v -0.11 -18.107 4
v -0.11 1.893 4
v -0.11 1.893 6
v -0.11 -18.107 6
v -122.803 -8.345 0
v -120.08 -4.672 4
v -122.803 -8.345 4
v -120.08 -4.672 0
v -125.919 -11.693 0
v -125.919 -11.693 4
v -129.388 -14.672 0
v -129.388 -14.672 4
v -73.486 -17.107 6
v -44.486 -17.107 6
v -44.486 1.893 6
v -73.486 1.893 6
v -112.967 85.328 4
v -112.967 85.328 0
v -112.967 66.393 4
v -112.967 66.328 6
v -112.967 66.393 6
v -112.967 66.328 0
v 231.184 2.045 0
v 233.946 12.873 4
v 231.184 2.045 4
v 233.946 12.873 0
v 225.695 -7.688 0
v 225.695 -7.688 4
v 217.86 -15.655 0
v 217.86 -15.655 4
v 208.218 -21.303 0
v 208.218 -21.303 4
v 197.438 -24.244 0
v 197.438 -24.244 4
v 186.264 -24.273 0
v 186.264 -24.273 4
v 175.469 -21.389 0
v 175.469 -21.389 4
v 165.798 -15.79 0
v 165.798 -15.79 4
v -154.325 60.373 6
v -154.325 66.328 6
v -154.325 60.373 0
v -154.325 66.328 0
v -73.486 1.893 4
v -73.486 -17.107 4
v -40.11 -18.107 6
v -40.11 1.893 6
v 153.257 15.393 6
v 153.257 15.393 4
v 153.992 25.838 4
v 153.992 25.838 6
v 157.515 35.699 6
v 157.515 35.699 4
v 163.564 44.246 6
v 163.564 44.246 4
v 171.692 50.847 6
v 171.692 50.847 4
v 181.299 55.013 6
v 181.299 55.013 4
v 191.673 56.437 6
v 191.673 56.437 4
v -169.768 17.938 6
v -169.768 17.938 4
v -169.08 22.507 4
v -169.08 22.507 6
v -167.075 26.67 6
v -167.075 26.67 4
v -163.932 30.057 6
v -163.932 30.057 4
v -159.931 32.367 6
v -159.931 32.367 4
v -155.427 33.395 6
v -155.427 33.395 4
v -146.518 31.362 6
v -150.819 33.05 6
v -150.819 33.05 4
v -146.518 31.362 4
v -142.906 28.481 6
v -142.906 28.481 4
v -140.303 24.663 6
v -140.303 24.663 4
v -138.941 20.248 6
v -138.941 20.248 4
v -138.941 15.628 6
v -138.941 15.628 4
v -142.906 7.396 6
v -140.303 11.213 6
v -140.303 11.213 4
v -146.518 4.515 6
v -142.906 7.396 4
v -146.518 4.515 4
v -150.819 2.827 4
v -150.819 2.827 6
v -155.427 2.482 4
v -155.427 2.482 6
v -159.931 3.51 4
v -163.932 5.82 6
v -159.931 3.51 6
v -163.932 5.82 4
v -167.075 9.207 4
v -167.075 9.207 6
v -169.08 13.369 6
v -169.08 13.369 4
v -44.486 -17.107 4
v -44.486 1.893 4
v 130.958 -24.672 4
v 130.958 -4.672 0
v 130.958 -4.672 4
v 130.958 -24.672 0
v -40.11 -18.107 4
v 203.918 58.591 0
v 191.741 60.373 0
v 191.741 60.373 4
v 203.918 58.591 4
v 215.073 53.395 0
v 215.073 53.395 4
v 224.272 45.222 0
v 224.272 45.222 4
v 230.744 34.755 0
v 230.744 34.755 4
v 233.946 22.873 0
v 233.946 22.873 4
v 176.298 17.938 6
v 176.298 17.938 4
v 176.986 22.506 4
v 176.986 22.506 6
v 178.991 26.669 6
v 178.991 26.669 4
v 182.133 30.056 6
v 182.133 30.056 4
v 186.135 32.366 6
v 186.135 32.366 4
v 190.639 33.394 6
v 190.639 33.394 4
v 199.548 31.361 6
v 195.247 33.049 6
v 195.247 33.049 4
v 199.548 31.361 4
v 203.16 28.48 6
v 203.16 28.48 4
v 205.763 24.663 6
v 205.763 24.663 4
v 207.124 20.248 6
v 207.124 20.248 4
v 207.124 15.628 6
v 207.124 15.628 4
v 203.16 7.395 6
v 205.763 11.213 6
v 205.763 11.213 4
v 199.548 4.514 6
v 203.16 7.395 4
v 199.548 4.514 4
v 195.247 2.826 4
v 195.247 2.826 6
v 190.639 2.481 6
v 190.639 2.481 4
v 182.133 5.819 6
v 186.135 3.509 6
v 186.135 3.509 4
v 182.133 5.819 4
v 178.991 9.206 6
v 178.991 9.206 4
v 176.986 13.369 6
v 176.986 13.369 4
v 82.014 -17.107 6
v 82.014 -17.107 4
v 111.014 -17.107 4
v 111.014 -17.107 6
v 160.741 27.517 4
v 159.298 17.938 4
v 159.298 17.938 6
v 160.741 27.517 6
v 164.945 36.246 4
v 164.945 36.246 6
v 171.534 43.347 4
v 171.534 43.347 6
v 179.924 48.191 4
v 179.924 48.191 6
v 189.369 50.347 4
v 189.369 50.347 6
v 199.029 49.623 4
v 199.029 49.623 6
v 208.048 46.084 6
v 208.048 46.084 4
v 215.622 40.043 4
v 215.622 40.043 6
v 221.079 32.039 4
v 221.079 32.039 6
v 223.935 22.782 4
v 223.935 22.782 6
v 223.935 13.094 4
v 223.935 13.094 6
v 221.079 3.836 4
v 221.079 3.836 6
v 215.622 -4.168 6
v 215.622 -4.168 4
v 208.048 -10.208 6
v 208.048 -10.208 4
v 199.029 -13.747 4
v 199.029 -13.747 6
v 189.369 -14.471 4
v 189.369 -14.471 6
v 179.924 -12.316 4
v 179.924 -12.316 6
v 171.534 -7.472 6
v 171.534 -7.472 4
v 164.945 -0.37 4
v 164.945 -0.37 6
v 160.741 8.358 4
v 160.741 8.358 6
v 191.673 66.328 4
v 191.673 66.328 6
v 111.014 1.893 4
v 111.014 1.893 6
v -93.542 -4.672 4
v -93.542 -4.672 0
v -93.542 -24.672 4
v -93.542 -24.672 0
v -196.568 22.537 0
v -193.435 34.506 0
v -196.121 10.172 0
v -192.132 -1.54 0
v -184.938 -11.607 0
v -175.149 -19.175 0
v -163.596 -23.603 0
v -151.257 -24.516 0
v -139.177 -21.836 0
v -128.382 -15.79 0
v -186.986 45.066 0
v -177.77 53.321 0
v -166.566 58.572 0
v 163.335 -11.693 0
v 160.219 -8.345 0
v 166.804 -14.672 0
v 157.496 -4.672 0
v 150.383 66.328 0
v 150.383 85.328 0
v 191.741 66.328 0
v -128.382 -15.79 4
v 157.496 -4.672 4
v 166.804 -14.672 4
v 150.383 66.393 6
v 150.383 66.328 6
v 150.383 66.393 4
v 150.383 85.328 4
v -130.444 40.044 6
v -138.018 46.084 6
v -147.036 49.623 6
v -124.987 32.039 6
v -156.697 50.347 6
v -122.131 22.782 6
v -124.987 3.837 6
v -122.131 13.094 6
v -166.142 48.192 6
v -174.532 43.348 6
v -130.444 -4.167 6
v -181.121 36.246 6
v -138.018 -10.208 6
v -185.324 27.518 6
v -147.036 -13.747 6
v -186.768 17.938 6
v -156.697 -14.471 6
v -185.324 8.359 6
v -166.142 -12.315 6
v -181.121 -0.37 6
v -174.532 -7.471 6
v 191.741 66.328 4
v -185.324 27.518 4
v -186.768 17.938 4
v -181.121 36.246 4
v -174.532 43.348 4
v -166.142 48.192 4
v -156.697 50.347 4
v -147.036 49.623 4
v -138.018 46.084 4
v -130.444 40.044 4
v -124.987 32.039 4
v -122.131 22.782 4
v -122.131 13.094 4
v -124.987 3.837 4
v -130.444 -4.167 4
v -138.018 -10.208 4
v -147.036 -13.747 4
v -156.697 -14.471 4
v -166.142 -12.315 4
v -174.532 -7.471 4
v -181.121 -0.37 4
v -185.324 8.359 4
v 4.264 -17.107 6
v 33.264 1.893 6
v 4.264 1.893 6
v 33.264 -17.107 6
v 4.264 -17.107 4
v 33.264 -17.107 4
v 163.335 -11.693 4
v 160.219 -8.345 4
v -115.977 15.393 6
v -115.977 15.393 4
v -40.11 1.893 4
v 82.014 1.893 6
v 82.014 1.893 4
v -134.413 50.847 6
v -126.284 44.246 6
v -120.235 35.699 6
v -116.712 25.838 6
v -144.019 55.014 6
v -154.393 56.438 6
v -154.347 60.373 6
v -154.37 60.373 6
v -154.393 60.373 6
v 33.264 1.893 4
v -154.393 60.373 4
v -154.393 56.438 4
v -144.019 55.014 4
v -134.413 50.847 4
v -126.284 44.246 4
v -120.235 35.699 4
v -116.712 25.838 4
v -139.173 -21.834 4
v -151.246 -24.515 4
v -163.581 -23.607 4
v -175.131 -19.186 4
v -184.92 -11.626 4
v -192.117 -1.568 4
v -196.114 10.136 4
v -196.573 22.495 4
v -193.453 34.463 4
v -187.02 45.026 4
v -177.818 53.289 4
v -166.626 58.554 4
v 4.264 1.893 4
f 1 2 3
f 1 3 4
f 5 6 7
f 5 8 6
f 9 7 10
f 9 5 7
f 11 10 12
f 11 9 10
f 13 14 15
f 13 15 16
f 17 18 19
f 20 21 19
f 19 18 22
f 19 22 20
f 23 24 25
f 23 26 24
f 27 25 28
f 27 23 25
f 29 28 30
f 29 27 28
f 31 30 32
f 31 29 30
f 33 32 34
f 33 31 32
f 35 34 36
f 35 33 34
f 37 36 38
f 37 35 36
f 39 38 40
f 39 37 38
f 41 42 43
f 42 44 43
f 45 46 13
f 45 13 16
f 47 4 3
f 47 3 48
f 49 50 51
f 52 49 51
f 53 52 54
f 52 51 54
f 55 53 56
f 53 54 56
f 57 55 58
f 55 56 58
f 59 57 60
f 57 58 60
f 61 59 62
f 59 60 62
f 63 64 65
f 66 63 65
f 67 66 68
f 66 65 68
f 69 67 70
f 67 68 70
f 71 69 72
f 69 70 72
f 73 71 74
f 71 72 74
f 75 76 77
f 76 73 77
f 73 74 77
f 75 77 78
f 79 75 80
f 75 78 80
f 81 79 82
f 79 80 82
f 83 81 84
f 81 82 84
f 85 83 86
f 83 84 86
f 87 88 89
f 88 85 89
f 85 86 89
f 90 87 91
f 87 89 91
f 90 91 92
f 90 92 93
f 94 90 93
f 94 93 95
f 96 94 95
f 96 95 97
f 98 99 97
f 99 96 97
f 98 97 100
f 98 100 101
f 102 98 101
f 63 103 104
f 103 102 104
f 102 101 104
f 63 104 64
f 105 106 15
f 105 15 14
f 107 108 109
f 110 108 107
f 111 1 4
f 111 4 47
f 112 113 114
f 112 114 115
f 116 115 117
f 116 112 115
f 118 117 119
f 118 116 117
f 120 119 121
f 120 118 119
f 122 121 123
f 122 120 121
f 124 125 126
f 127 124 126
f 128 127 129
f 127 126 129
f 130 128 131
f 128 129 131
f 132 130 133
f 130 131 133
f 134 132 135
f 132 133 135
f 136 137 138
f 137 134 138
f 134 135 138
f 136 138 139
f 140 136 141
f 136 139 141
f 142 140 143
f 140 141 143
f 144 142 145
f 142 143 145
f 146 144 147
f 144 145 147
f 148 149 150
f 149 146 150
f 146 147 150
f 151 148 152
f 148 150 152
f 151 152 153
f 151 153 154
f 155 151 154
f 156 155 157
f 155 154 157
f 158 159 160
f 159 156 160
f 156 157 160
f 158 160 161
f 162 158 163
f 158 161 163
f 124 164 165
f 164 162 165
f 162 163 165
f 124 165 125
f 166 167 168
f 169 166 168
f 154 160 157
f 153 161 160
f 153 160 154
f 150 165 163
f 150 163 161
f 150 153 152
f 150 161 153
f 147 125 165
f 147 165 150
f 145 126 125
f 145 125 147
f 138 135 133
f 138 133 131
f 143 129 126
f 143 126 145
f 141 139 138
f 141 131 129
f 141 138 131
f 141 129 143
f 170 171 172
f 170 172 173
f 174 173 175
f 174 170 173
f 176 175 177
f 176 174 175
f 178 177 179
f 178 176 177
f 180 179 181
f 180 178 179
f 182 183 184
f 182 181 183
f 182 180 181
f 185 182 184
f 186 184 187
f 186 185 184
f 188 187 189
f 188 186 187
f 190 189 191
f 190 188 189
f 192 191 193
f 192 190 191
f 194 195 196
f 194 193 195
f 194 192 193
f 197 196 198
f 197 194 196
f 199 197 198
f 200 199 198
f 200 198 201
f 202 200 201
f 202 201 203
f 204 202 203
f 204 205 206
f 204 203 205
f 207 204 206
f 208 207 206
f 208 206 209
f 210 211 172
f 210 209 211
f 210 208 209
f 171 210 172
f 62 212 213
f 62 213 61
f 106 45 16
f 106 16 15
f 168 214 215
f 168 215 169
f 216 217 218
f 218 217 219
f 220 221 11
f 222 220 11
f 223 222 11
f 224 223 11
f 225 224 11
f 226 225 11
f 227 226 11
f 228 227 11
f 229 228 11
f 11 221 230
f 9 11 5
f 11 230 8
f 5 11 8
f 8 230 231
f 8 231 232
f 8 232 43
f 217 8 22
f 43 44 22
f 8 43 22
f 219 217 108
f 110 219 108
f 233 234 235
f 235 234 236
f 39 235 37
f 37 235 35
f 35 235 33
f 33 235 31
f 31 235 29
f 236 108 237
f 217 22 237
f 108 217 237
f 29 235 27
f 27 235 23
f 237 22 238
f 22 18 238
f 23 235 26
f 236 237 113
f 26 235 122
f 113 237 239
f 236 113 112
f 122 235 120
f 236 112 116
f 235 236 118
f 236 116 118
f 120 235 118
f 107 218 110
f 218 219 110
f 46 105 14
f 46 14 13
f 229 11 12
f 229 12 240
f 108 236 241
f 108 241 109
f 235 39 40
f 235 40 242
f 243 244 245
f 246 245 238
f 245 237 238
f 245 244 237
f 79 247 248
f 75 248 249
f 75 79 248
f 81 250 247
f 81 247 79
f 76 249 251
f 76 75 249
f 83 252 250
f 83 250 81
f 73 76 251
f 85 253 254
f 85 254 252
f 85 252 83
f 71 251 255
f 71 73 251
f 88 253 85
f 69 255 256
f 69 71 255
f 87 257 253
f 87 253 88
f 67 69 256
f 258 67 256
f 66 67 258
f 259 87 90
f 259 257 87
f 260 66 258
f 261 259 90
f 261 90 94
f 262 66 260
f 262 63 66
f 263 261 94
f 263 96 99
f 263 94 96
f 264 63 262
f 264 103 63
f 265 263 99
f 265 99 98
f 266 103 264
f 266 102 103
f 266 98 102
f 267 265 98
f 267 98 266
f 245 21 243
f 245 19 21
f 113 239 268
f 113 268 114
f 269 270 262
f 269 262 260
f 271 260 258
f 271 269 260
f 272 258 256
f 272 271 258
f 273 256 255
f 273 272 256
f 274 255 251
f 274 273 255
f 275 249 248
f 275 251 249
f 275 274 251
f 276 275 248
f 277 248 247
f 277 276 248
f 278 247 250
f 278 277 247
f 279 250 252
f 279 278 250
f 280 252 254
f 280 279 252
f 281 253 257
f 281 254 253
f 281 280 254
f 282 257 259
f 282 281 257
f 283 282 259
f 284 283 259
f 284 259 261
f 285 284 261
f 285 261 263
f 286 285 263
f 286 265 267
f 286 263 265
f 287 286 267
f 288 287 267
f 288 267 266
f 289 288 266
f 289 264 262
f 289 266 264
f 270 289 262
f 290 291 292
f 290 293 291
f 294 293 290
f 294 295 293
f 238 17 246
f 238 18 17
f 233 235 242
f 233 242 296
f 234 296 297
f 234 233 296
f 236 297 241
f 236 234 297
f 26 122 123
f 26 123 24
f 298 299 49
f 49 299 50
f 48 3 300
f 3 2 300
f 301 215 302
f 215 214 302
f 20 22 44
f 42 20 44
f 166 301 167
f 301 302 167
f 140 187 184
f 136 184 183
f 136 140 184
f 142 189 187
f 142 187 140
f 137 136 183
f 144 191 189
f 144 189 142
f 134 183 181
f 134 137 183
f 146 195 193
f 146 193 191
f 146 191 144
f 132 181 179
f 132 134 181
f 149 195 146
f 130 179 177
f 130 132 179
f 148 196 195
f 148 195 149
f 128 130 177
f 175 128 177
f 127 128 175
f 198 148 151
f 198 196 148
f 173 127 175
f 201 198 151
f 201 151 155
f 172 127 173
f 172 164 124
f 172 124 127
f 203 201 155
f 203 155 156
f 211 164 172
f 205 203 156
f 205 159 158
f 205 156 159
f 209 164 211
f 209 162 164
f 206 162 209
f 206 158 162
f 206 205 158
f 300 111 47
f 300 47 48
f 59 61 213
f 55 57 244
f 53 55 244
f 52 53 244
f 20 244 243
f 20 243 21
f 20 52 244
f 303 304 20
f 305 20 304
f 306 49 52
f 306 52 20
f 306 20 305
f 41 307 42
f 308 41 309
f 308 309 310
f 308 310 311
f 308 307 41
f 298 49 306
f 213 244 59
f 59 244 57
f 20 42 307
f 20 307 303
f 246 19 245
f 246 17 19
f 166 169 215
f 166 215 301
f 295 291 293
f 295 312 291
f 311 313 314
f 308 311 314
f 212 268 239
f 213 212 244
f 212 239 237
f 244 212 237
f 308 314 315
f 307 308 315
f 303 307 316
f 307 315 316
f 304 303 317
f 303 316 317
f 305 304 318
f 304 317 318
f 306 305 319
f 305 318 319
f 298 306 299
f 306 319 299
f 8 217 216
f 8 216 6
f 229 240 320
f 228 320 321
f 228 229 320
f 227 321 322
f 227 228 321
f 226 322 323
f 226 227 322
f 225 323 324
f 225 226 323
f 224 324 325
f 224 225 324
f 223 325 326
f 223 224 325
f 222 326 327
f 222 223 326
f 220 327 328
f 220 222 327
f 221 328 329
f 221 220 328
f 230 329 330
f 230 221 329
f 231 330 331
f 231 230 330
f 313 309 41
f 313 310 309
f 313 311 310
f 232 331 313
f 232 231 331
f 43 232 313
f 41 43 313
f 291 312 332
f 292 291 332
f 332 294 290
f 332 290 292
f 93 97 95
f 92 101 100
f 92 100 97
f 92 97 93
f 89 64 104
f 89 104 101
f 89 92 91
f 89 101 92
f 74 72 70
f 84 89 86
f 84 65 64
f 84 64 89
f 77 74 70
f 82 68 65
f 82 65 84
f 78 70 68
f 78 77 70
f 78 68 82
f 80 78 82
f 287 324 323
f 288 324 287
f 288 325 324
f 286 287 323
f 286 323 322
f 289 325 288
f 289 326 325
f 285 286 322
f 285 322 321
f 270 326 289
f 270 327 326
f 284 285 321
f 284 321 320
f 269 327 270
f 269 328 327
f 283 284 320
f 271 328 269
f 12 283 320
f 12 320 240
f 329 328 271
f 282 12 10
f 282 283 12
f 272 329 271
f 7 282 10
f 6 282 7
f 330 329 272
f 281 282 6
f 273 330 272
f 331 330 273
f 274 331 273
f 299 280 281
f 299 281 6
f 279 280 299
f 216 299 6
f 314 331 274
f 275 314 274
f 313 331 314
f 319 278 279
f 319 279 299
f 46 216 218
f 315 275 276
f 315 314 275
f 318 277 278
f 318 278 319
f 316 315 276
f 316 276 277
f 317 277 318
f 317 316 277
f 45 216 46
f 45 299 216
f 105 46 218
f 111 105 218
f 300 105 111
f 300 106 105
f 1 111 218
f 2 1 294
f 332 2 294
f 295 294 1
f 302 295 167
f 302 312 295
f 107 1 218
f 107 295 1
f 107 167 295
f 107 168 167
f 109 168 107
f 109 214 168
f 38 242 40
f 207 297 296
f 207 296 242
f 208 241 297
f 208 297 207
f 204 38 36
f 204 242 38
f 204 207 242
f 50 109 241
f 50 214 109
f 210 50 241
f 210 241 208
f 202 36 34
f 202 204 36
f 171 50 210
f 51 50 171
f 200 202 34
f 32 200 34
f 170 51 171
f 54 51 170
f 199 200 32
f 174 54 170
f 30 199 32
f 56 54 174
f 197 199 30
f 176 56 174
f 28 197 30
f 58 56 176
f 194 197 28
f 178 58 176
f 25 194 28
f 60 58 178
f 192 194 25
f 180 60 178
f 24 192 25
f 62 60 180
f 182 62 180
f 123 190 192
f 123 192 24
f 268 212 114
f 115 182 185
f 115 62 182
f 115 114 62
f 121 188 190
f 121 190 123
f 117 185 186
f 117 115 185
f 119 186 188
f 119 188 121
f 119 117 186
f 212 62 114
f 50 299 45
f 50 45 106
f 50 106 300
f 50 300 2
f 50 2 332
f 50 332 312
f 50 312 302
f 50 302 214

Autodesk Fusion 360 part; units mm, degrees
sketch "Sketch1" plane through (0, 0, 0) normal (0, 0, 1) x (1, 0, 0)
  line L0 (110.9582, 1.828) -> (110.9582, -11.672)
  line L1 (-73.5418, 1.828) -> (-73.5418, -11.672)
  line L2 (-73.5418, -24.672) -> (110.9582, -24.672)
  line L3 (-73.5418, 15.328) -> (110.9582, 15.328)
  line L4 (110.9582, -24.672) -> (130.9582, -24.672)
  line L5 (130.9582, -24.672) -> (130.9582, -11.672)
  line L6 (130.9582, 15.328) -> (110.9582, 15.328)
  line L7 (-73.5418, 15.328) -> (-93.5418, 15.328)
  line L8 (-93.5418, -4.672) -> (-93.5418, -24.672)
  line L9 (-93.5418, -24.672) -> (-73.5418, -24.672)
  line L10 (130.9582, -4.672) -> (150.3831, -4.672)
  line L11 (130.9582, 15.328) -> (150.3831, 15.328)
  line L12 (-93.5418, -24.672) -> (-93.5418, -24)
  line L13 (-93.5418, -4.672) -> (-112.9667, -4.672)
  line L14 (-93.5418, 15.328) -> (-112.9667, 15.328)
  line L15 (130.9582, -4.672) -> (130.9582, -11.672)
  line L16 (-112.9667, 85.328) -> (-110, 85.328)
  line L17 (-110, 85.328) -> (150.3831, 85.328)
  line L18 (18.7082, 66.328) -> (150.3831, 66.328)
  line L19 (18.7082, 66.328) -> (16.2618, 66.328)
  line L20 (16.2618, 66.328) -> (-112.9667, 66.328)
  line L21 (157.4958, -4.672) -> (150.3831, -4.672)
  line L22 (191.7412, -4.672) -> (190, -4.672)
  line L23 (-112.9667, -4.672) -> (-120.0796, -4.672)
  circle A0 centre (191.7412, 17.8726) radius 32.5
  circle A1 centre (-154.3247, 17.873) radius 32.5
  line L24 (-112.9667, 66.328) -> (-154.3247, 66.328)
  line L25 (-154.3247, 66.328) -> (-154.3247, 60.373)
  line L26 (150.3831, 66.328) -> (191.7412, 66.328)
  line L27 (191.7412, 66.328) -> (191.7412, 60.3726)
  line L28 (150.3831, 66.328) -> (150.3831, 85.328)
  line L29 (150.3831, 15.328) -> (153.3253, 15.328)
  line L30 (191.7412, 60.3726) -> (191.7412, 56.3726)
  arc A2 (157.4958, -4.672) -> (166.8041, -14.672) centre (191.7412, 17.8726) ccw
  arc A3 (191.7412, 56.3726) -> (153.3253, 15.328) centre (191.7412, 17.8726) ccw
  line L31 (-112.9667, 66.328) -> (-112.9667, 85.328)
  line L32 (-154.3247, 60.373) -> (-154.3247, 56.373)
  line L33 (-112.9667, 15.328) -> (-115.9089, 15.328)
  arc A4 (-154.3247, 60.373) -> (-128.382, -15.7904) centre (-154.3247, 17.873) ccw
  arc A5 (-129.3883, -14.672) -> (-120.0796, -4.672) centre (-154.3247, 17.873) ccw
  arc A6 (-115.9089, 15.328) -> (-154.3247, 56.373) centre (-154.3247, 17.873) ccw
  line L34 (130.9582, -24.672) -> (130.9582, -14.672)
  line L35 (165.7979, -15.7904) -> (166.8041, -14.672)
  line L36 (-129.3883, -14.672) -> (-128.382, -15.7904)
  arc A7 (165.7979, -15.7904) -> (233.946, 12.8726) centre (191.7412, 17.8726) ccw
  arc A8 (233.946, 22.8726) -> (191.7412, 60.3726) centre (191.7412, 17.8726) ccw
  line L37 (110.9582, 1.828) -> (81.9582, 1.828)
  line L38 (81.9582, 1.828) -> (81.9582, -17.172)
  line L39 (81.9582, -17.172) -> (110.9582, -17.172)
  line L40 (110.9582, -17.172) -> (110.9582, -11.672)
  line L41 (-73.5418, 1.828) -> (-44.5418, 1.828)
  line L42 (-44.5418, 1.828) -> (-44.5418, -17.172)
  line L43 (-44.5418, -17.172) -> (-73.5418, -17.172)
  line L44 (-73.5418, -17.172) -> (-73.5418, -11.672)
  line L45 (33.2082, 1.828) -> (4.2082, 1.828)
  line L46 (33.2082, 1.828) -> (33.2082, -17.172)
  line L47 (33.2082, -17.172) -> (4.2082, -17.172)
  line L48 (4.2082, -17.172) -> (4.2082, 1.828)
  line L49 (-0.1668, 1.828) -> (-40.1668, 1.828)
  line L50 (-0.1668, 1.828) -> (-0.1668, -18.172)
  line L51 (-0.1668, -18.172) -> (-40.1668, -18.172)
  line L52 (-40.1668, -18.172) -> (-40.1668, 1.828)
  line L53 (233.946, 22.8726) -> (233.946, 12.8726)
  circle A9 centre (-154.3247, 17.873) radius 15.5
  circle A10 centre (191.7412, 17.8726) radius 15.5
  dimension "d9" = 13
  dimension "d10" = 13
  dimension "d12" = 13.5
  dimension "d13" = 13.5
  dimension "d14" = 20
  dimension "d15" = 20
  dimension "d16" = 20
  dimension "d17" = 20
  dimension "d50" = 70
  dimension "d51" = 70
  dimension "d57" = 65
  dimension "d58" = 77
  dimension "d59" = 65
  dimension "d60" = 77
  dimension "d61" = 82
  dimension "d63" = 82
  dimension "d64" = 85
  dimension "d65" = 10
  dimension "d68" = 29
  dimension "d69" = 19
  dimension "d70" = 29
  dimension "d71" = 19
  dimension "d73" = 29
  dimension "d74" = 19
  dimension "d76" = 40
  dimension "d77" = 20
  dimension "d78" = 40
  dimension "d79" = 31
  dimension "d80" = 31
extrude "Extrude1" add sketch "Sketch1" along normal blind 4 contours L0 L37 L38 L39 L40 | L1 L41 L42 L43 L44 | L2 L3 L4 L5 L6 L7 L8 L9 L10 L11 L12 L13 L14 L15 L21 L23 L29 L30 A2 A3 L32 L33 A4 A5 A6 L34 L35 L36 A7 A8 L53 | L3 L6 L7 L11 L14 L18 L19 L20 L24 L25 L26 L27 L29 L30 A3 L32 L33 A6 | L16 L17 L18 L19 L20 L28 L31 | A0 | A1 | L45 L46 L47 L48 | L49 L50 L51 L52 | A9 | A10
sketch "Sketch2" plane through (0, 0, 4) normal (0, 0, 1) x (-1, 0, 0)
  line L0 (-150.3831, -66.328) -> (-150.3831, -85.328)
  line L1 (-150.3831, -85.328) -> (112.9667, -85.328)
  line L2 (112.9667, -85.328) -> (112.9667, -66.328)
  line L3 (112.9667, -66.328) -> (154.3247, -66.328)
  line L4 (154.3247, -66.328) -> (154.3247, -60.373)
  arc A0 (154.3247, -60.373) -> (128.382, 15.7904) centre (154.3247, -17.873) ccw
  line L5 (128.382, 15.7904) -> (129.3883, 14.672)
  arc A1 (129.3883, 14.672) -> (120.0796, 4.672) centre (154.3247, -17.873) ccw
  line L6 (120.0796, 4.672) -> (93.5418, 4.672)
  line L7 (93.5418, 4.672) -> (93.5418, 24.672)
  line L8 (93.5418, 24.672) -> (-130.9582, 24.672)
  line L9 (-130.9582, 24.672) -> (-130.9582, 4.672)
  line L10 (-130.9582, 4.672) -> (-157.4958, 4.672)
  arc A2 (-157.4958, 4.672) -> (-166.8041, 14.672) centre (-191.7412, -17.8726) ccw
  line L11 (-166.8041, 14.672) -> (-165.7979, 15.7904)
  arc A3 (-165.7979, 15.7904) -> (-233.946, -12.8726) centre (-191.7412, -17.8726) ccw
  line L12 (-233.946, -12.8726) -> (-233.946, -22.8726)
  arc A4 (-233.946, -22.8726) -> (-191.7412, -60.3726) centre (-191.7412, -17.8726) ccw
  line L13 (-191.7412, -60.3726) -> (-191.7412, -66.328)
  line L14 (-191.7412, -66.328) -> (-150.3831, -66.328)
  arc A5 (-191.6728, -56.4374) -> (-153.2569, -15.3929) centre (-191.6728, -17.9374) ccw
  line L15 (154.393, -66.3929) -> (154.393, -60.4379)
  line L16 (73.6102, -15.3929) -> (-110.8898, -15.3929)
  line L17 (113.035, -66.3929) -> (113.035, -85.3929)
  line L18 (40.2352, 18.1071) -> (40.2352, -1.8929)
  line L19 (110.0684, -85.3929) -> (-150.3147, -85.3929)
  line L20 (0.2352, 18.1071) -> (40.2352, 18.1071)
  line L21 (-33.1398, -1.8929) -> (-33.1398, 17.1071)
  line L22 (-16.1934, -66.3929) -> (113.035, -66.3929)
  arc A6 (154.393, -60.4379) -> (128.4504, 15.7255) centre (154.393, -17.9379) ccw
  line L23 (-18.6398, -66.3929) -> (-150.3147, -66.3929)
  line L24 (73.6102, 24.6071) -> (-110.8898, 24.6071)
  arc A7 (129.4567, 14.6071) -> (120.148, 4.6071) centre (154.393, -17.9379) ccw
  line L25 (113.035, -66.3929) -> (154.393, -66.3929)
  line L26 (73.6102, -15.3929) -> (93.6102, -15.3929)
  line L27 (113.035, -15.3929) -> (115.9772, -15.3929)
  line L28 (113.035, 4.6071) -> (120.148, 4.6071)
  line L29 (93.6102, 4.6071) -> (113.035, 4.6071)
  line L30 (93.6102, 24.6071) -> (93.6102, 23.9351)
  line L31 (44.6102, 17.1071) -> (73.6102, 17.1071)
  line L32 (93.6102, 4.6071) -> (93.6102, 24.6071)
  line L33 (0.2352, -1.8929) -> (0.2352, 18.1071)
  line L34 (73.6102, -1.8929) -> (44.6102, -1.8929)
  line L35 (93.6102, 24.6071) -> (73.6102, 24.6071)
  line L36 (73.6102, 17.1071) -> (73.6102, 11.6071)
  line L37 (-18.6398, -66.3929) -> (-16.1934, -66.3929)
  line L38 (129.4567, 14.6071) -> (128.4504, 15.7255)
  line L39 (73.6102, -1.8929) -> (73.6102, 11.6071)
  line L40 (154.393, -60.4379) -> (154.393, -56.4379)
  line L41 (-4.1398, 17.1071) -> (-4.1398, -1.8929)
  line L42 (44.6102, -1.8929) -> (44.6102, 17.1071)
  line L43 (113.035, -85.3929) -> (110.0684, -85.3929)
  line L44 (93.6102, -15.3929) -> (113.035, -15.3929)
  line L45 (-33.1398, 17.1071) -> (-4.1398, 17.1071)
  line L46 (-33.1398, -1.8929) -> (-4.1398, -1.8929)
  line L47 (0.2352, -1.8929) -> (40.2352, -1.8929)
  circle A8 centre (-191.6728, -17.9374) radius 15.5
  line L48 (-110.8898, -1.8929) -> (-81.8898, -1.8929)
  line L49 (-191.6728, -60.4374) -> (-191.6728, -56.4374)
  line L50 (-130.8898, 4.6071) -> (-150.3147, 4.6071)
  line L51 (-130.8898, -15.3929) -> (-110.8898, -15.3929)
  line L52 (-81.8898, -1.8929) -> (-81.8898, 17.1071)
  arc A9 (-233.8776, -22.9374) -> (-191.6728, -60.4374) centre (-191.6728, -17.9374) ccw
  circle A10 centre (-191.6728, -17.9374) radius 32.5
  line L53 (-130.8898, 24.6071) -> (-130.8898, 11.6071)
  arc A11 (-157.4274, 4.6071) -> (-166.7357, 14.6071) centre (-191.6728, -17.9374) ccw
  line L54 (-157.4274, 4.6071) -> (-150.3147, 4.6071)
  line L55 (-110.8898, 24.6071) -> (-130.8898, 24.6071)
  line L56 (-130.8898, -15.3929) -> (-150.3147, -15.3929)
  line L57 (-110.8898, 17.1071) -> (-110.8898, 11.6071)
  line L58 (-165.7295, 15.7255) -> (-166.7357, 14.6071)
  line L59 (-191.6728, -66.3929) -> (-191.6728, -60.4374)
  line L60 (-130.8898, 24.6071) -> (-130.8898, 14.6071)
  line L61 (-81.8898, 17.1071) -> (-110.8898, 17.1071)
  arc A12 (-165.7295, 15.7255) -> (-233.8776, -12.9374) centre (-191.6728, -17.9374) ccw
  line L62 (-150.3147, -15.3929) -> (-153.2569, -15.3929)
  line L63 (-233.8776, -22.9374) -> (-233.8776, -12.9374)
  line L64 (-110.8898, -1.8929) -> (-110.8898, 11.6071)
  line L65 (-150.3147, -66.3929) -> (-150.3147, -85.3929)
  line L66 (-130.8898, 4.6071) -> (-130.8898, 11.6071)
  line L67 (-150.3147, -66.3929) -> (-191.6728, -66.3929)
  circle A13 centre (154.393, -17.9379) radius 32.5
  circle A14 centre (154.393, -17.9379) radius 15.5
  arc A15 (115.9772, -15.3929) -> (154.393, -56.4379) centre (154.393, -17.9379) ccw
  point P0 (0.0684, -0.0649)
  dimension "d83" = 13
  dimension "d84" = 13
  dimension "d85" = 13.5
  dimension "d86" = 13.5
  dimension "d87" = 20
  dimension "d88" = 20
  dimension "d89" = 20
  dimension "d90" = 20
  dimension "d91" = 70
  dimension "d92" = 70
  dimension "d93" = 65
  dimension "d94" = 77
  dimension "d95" = 65
  dimension "d96" = 77
  dimension "d97" = 82
  dimension "d98" = 82
  dimension "d99" = 85
  dimension "d100" = 10
  dimension "d101" = 29
  dimension "d102" = 19
  dimension "d103" = 29
  dimension "d104" = 19
  dimension "d105" = 29
  dimension "d106" = 19
  dimension "d107" = 40
  dimension "d108" = 20
  dimension "d109" = 40
  dimension "d110" = 31
  dimension "d111" = 31
extrude "Extrude2" add sketch "Sketch2" along normal blind 2 contours L0 L2 L3 L4 A0 L14 A5 L16 L22 L23 L26 L27 L37 L40 L44 L49 L51 L56 L59 L62 L67 A15
sketch "Sketch3" plane through (0, 0, 4) normal (0, 0, 1) x (-1, 0, 0)
  line L0 (-191.6728, -66.328) -> (-191.6728, -56.4374)
  arc A0 (-191.6728, -56.4374) -> (-153.2569, -15.3929) centre (-191.6728, -17.9374) ccw
  line L1 (-153.2569, -15.3929) -> (115.9772, -15.3929)
  arc A1 (115.9772, -15.3929) -> (154.393, -56.4379) centre (154.393, -17.9379) ccw
  line L2 (154.393, -56.4379) -> (154.393, -60.373)
  arc A2 (154.393, -60.373) -> (128.382, 15.7904) centre (154.3247, -17.873) ccw
  line L3 (128.382, 15.7904) -> (129.3883, 14.672)
  arc A3 (129.3883, 14.672) -> (120.0796, 4.672) centre (154.3247, -17.873) ccw
  line L4 (120.0796, 4.672) -> (93.5418, 4.672)
  line L5 (93.5418, 4.672) -> (93.5418, 24.672)
  line L6 (93.5418, 24.672) -> (-130.9582, 24.672)
  line L7 (-130.9582, 24.672) -> (-130.9582, 4.672)
  line L8 (-130.9582, 4.672) -> (-157.4958, 4.672)
  arc A4 (-157.4958, 4.672) -> (-166.8041, 14.672) centre (-191.7412, -17.8726) ccw
  line L9 (-166.8041, 14.672) -> (-165.7979, 15.7904)
  arc A5 (-165.7979, 15.7904) -> (-233.946, -12.8726) centre (-191.7412, -17.8726) ccw
  line L10 (-233.946, -12.8726) -> (-233.946, -22.8726)
  arc A6 (-233.946, -22.8726) -> (-191.7412, -60.3726) centre (-191.7412, -17.8726) ccw
  line L11 (-191.7412, -60.3726) -> (-191.7412, -66.328)
  line L12 (-191.7412, -66.328) -> (-191.6728, -66.328)
  arc A7 (-191.7975, -56.4377) -> (-153.3817, -15.3932) centre (-191.7975, -17.9377) ccw
  line L13 (154.2683, -66.3932) -> (154.2683, -60.4382)
  line L14 (73.4855, -15.3932) -> (-111.0145, -15.3932)
  line L15 (112.9103, -66.3932) -> (112.9103, -85.3932)
  line L16 (40.1105, 18.1068) -> (40.1105, -1.8932)
  line L17 (109.9436, -85.3932) -> (-150.4395, -85.3932)
  line L18 (0.1105, 18.1068) -> (40.1105, 18.1068)
  line L19 (-33.2645, -1.8932) -> (-33.2645, 17.1068)
  line L20 (-16.3182, -66.3932) -> (112.9103, -66.3932)
  arc A8 (154.2683, -60.4382) -> (128.3256, 15.7252) centre (154.2683, -17.9382) ccw
  line L21 (-18.7645, -66.3932) -> (-150.4395, -66.3932)
  line L22 (73.4855, 24.6068) -> (-111.0145, 24.6068)
  arc A9 (129.3319, 14.6068) -> (120.0232, 4.6068) centre (154.2683, -17.9382) ccw
  line L23 (112.9103, -66.3932) -> (154.2683, -66.3932)
  line L24 (73.4855, -15.3932) -> (93.4855, -15.3932)
  line L25 (112.9103, -15.3932) -> (115.8525, -15.3932)
  line L26 (112.9103, 4.6068) -> (120.0232, 4.6068)
  line L27 (93.4855, 4.6068) -> (112.9103, 4.6068)
  line L28 (93.4855, 24.6068) -> (93.4855, 23.9348)
  line L29 (44.4855, 17.1068) -> (73.4855, 17.1068)
  line L30 (93.4855, 4.6068) -> (93.4855, 24.6068)
  line L31 (0.1105, -1.8932) -> (0.1105, 18.1068)
  line L32 (73.4855, -1.8932) -> (44.4855, -1.8932)
  line L33 (93.4855, 24.6068) -> (73.4855, 24.6068)
  line L34 (73.4855, 17.1068) -> (73.4855, 11.6068)
  line L35 (-18.7645, -66.3932) -> (-16.3182, -66.3932)
  line L36 (129.3319, 14.6068) -> (128.3256, 15.7252)
  line L37 (73.4855, -1.8932) -> (73.4855, 11.6068)
  line L38 (154.2683, -60.4382) -> (154.2683, -56.4382)
  line L39 (-4.2645, 17.1068) -> (-4.2645, -1.8932)
  line L40 (44.4855, -1.8932) -> (44.4855, 17.1068)
  line L41 (112.9103, -85.3932) -> (109.9436, -85.3932)
  line L42 (93.4855, -15.3932) -> (112.9103, -15.3932)
  line L43 (-33.2645, 17.1068) -> (-4.2645, 17.1068)
  line L44 (-33.2645, -1.8932) -> (-4.2645, -1.8932)
  line L45 (0.1105, -1.8932) -> (40.1105, -1.8932)
  circle A10 centre (-191.7975, -17.9377) radius 15.5
  line L46 (-111.0145, -1.8932) -> (-82.0145, -1.8932)
  line L47 (-191.7975, -60.4377) -> (-191.7975, -56.4377)
  line L48 (-131.0145, 4.6068) -> (-150.4395, 4.6068)
  line L49 (-131.0145, -15.3932) -> (-111.0145, -15.3932)
  line L50 (-82.0145, -1.8932) -> (-82.0145, 17.1068)
  arc A11 (-234.0024, -22.9377) -> (-191.7975, -60.4377) centre (-191.7975, -17.9377) ccw
  circle A12 centre (-191.7975, -17.9377) radius 32.5
  line L51 (-131.0145, 24.6068) -> (-131.0145, 11.6068)
  arc A13 (-157.5522, 4.6068) -> (-166.8605, 14.6068) centre (-191.7975, -17.9377) ccw
  line L52 (-157.5522, 4.6068) -> (-150.4395, 4.6068)
  line L53 (-111.0145, 24.6068) -> (-131.0145, 24.6068)
  line L54 (-131.0145, -15.3932) -> (-150.4395, -15.3932)
  line L55 (-111.0145, 17.1068) -> (-111.0145, 11.6068)
  line L56 (-165.8542, 15.7252) -> (-166.8605, 14.6068)
  line L57 (-191.7975, -66.3932) -> (-191.7975, -60.4377)
  line L58 (-131.0145, 24.6068) -> (-131.0145, 14.6068)
  line L59 (-82.0145, 17.1068) -> (-111.0145, 17.1068)
  arc A14 (-165.8542, 15.7252) -> (-234.0024, -12.9377) centre (-191.7975, -17.9377) ccw
  line L60 (-150.4395, -15.3932) -> (-153.3817, -15.3932)
  line L61 (-234.0024, -22.9377) -> (-234.0024, -12.9377)
  line L62 (-111.0145, -1.8932) -> (-111.0145, 11.6068)
  line L63 (-150.4395, -66.3932) -> (-150.4395, -85.3932)
  line L64 (-131.0145, 4.6068) -> (-131.0145, 11.6068)
  line L65 (-150.4395, -66.3932) -> (-191.7975, -66.3932)
  circle A15 centre (154.2683, -17.9382) radius 32.5
  circle A16 centre (154.2683, -17.9382) radius 15.5
  arc A17 (115.8525, -15.3932) -> (154.2683, -56.4382) centre (154.2683, -17.9382) ccw
  point P0 (-0.0564, -0.0652)
  dimension "d114" = 13
  dimension "d115" = 13
  dimension "d116" = 13.5
  dimension "d117" = 13.5
  dimension "d118" = 20
  dimension "d119" = 20
  dimension "d120" = 20
  dimension "d121" = 20
  dimension "d122" = 70
  dimension "d123" = 70
  dimension "d124" = 65
  dimension "d125" = 77
  dimension "d126" = 65
  dimension "d127" = 77
  dimension "d128" = 82
  dimension "d129" = 82
  dimension "d130" = 85
  dimension "d131" = 10
  dimension "d132" = 29
  dimension "d133" = 19
  dimension "d134" = 29
  dimension "d135" = 19
  dimension "d136" = 29
  dimension "d137" = 19
  dimension "d138" = 40
  dimension "d139" = 20
  dimension "d140" = 40
  dimension "d141" = 31
  dimension "d142" = 31
extrude "Extrude3" add sketch "Sketch3" along normal blind 2 contours L16 L18 L31 L45 | L19 L39 L43 L44 | L29 L32 L34 L37 L40 | L46 L50 L55 L59 L62 | A12 | A15
